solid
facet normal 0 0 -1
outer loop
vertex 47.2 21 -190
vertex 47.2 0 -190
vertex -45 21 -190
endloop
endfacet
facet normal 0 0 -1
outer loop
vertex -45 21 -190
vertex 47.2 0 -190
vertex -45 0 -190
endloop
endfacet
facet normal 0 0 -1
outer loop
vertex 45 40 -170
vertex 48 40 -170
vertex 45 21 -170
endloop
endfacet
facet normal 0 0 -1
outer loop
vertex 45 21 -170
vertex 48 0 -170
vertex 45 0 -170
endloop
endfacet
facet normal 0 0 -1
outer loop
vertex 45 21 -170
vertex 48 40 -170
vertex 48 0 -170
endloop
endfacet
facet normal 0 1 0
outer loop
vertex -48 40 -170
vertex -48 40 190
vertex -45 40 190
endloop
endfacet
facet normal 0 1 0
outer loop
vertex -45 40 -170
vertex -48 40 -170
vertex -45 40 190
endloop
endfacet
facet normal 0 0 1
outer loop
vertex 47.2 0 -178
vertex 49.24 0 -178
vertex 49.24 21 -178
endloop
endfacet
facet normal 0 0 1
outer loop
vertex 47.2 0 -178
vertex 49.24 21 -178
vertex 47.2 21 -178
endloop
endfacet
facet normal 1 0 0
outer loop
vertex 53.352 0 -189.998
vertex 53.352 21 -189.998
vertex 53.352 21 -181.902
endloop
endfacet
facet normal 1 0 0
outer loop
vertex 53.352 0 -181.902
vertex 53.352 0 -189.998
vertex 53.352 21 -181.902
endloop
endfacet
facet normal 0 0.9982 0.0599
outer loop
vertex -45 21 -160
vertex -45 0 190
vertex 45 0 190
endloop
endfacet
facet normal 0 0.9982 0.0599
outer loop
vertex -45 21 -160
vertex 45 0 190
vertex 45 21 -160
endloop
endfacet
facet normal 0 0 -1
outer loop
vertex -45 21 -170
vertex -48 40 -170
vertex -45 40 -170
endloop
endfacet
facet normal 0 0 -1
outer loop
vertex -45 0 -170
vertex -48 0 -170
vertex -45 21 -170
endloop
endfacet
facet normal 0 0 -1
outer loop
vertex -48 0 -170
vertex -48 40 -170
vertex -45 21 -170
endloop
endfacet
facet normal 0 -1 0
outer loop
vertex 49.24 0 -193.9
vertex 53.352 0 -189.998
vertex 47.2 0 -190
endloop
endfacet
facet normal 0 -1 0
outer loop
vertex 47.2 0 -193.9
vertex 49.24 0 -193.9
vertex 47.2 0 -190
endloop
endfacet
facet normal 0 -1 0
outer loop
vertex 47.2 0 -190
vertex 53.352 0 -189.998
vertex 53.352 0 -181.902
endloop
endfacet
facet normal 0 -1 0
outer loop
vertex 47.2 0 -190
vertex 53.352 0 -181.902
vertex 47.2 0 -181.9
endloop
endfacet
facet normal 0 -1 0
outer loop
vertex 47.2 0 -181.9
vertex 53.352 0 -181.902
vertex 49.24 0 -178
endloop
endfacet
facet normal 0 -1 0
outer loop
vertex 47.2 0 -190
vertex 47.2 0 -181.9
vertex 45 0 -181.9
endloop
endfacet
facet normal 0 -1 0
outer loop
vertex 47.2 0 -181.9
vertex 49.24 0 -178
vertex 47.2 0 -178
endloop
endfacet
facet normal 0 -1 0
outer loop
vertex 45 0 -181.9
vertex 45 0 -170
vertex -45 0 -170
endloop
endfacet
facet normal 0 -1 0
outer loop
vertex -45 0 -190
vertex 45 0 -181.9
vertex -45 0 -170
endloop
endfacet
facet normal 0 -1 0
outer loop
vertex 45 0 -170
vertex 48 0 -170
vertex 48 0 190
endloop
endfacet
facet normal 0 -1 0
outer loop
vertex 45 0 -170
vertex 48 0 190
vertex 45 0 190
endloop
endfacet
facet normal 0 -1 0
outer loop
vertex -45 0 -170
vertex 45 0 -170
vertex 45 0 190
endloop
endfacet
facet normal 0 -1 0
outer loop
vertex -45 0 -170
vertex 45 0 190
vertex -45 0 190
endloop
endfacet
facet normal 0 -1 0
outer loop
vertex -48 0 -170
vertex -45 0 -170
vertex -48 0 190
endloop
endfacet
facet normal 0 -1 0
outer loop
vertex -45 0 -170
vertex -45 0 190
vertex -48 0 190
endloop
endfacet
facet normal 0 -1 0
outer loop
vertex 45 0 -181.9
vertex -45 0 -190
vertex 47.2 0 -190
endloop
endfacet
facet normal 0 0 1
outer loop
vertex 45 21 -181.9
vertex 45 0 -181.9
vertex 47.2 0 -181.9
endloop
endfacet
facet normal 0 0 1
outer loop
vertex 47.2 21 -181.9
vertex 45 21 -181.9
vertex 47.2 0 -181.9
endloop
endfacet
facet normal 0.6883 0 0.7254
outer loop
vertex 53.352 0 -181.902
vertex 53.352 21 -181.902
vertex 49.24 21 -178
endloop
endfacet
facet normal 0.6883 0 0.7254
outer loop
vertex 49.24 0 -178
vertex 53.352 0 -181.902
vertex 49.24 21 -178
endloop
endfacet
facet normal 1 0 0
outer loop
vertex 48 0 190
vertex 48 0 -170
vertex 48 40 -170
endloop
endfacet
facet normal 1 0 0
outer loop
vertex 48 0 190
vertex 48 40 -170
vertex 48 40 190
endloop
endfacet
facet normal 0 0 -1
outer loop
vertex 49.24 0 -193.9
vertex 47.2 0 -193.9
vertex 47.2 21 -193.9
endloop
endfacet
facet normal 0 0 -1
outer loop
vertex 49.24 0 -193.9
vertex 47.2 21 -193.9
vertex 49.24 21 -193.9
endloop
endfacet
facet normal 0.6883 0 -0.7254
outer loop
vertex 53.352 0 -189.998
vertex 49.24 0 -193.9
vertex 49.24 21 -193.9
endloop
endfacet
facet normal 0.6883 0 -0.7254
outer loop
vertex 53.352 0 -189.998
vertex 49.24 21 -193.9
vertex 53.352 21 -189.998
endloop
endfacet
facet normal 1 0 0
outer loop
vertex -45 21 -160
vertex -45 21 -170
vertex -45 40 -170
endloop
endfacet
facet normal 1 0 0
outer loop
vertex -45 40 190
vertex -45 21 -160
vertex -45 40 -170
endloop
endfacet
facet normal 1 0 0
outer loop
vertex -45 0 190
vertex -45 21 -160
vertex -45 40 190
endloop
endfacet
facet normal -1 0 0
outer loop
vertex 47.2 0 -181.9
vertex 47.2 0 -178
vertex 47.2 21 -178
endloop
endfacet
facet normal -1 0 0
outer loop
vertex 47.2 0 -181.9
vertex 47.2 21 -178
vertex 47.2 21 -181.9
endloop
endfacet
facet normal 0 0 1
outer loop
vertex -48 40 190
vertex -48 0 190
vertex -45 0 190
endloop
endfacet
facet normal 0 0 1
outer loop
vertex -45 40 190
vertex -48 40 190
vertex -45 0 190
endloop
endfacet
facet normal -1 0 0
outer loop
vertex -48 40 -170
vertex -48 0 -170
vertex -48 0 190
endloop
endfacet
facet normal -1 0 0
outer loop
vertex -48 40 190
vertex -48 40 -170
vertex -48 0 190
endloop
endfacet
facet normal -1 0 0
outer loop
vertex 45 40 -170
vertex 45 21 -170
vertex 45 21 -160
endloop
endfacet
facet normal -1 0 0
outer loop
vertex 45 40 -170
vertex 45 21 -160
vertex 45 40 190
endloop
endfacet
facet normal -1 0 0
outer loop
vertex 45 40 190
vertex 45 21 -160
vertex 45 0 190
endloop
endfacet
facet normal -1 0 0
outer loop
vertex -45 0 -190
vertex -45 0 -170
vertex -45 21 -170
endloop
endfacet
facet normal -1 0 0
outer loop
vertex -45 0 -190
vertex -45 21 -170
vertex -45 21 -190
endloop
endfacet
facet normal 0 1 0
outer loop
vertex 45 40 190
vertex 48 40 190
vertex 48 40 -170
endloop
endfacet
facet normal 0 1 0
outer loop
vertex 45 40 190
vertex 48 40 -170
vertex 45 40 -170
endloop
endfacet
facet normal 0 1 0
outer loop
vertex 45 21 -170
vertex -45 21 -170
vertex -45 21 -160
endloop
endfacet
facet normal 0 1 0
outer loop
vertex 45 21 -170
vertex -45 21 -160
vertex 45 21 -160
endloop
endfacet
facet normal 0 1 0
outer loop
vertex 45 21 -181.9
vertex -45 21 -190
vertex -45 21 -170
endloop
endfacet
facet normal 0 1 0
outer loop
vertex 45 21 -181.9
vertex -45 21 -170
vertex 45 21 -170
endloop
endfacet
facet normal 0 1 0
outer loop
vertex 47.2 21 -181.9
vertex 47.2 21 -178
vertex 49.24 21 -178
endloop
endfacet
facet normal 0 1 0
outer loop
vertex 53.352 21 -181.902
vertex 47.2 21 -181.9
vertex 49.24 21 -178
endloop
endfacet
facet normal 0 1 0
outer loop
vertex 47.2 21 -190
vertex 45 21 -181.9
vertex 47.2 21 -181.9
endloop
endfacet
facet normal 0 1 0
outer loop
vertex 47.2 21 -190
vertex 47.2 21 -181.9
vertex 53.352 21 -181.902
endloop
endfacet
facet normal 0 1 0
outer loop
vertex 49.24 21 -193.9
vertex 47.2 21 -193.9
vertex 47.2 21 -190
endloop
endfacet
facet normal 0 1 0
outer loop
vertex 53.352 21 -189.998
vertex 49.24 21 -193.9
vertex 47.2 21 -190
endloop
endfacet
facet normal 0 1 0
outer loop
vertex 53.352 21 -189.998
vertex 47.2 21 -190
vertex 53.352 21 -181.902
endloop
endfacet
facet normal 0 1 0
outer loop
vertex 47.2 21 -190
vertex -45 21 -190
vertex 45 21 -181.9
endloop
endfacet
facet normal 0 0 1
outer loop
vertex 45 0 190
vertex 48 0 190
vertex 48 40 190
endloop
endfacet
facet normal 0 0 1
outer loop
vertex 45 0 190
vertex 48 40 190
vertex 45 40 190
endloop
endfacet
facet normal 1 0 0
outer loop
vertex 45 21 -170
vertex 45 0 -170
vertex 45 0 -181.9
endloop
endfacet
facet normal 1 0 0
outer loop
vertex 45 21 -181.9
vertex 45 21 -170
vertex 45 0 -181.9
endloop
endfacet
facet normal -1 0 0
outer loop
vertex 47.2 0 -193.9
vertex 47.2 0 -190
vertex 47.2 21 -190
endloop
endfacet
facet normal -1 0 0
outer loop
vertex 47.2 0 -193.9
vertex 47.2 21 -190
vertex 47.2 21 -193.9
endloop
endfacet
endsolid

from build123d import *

# Parameters (mm, degrees)
SKETCH1_W           = 90
SKETCH1_H           = 380
SKETCH1_W_2         = 2.2
SKETCH1_H_2         = 8.1
BOSS_EXTRUDE1_DEPTH = 21
CUT_EXTRUDE1_DEPTH  = 99.352414984
SKETCH2_W           = 3
SKETCH2_H           = 360
BOSS_EXTRUDE2_DEPTH = 40


with BuildPart() as part:
    # Sketch1 → Boss-Extrude1 (new body)
    with BuildSketch(Plane(origin=(0, 0, 0), x_dir=(1, 0, 0), z_dir=(0, 1, 0))):
        Rectangle(SKETCH1_W, SKETCH1_H)
        with Locations((46.1, 185.95)):
            Rectangle(SKETCH1_W_2, SKETCH1_H_2)
        Polygon((49.24, 178), (47.2, 178), (47.2, 193.9), (49.24, 193.9), (53.352414984, 189.998), (53.352414984, 181.902), align=None)
    extrude(amount=BOSS_EXTRUDE1_DEPTH)

    # Sketch3 → Cut-Extrude1 (cut, through all)
    with BuildSketch(Plane.ZY.offset(45)):
        Polygon((190, 0), (-160, 21), (190, 21), align=None)
    extrude(amount=-CUT_EXTRUDE1_DEPTH, mode=Mode.SUBTRACT)

    # Sketch2 → Boss-Extrude2 (add)
    with BuildSketch(Plane.XZ):
        with Locations((-46.5, 10)):
            Rectangle(SKETCH2_W, SKETCH2_H)
    boss_extrude2 = extrude(amount=-BOSS_EXTRUDE2_DEPTH)

    # Mirror1: Boss-Extrude2 across plane
    add(boss_extrude2.mirror(Plane(origin=(0, 0, 0), x_dir=(0, 0, 1), z_dir=(1, 0, 0))))


solid = part.part
